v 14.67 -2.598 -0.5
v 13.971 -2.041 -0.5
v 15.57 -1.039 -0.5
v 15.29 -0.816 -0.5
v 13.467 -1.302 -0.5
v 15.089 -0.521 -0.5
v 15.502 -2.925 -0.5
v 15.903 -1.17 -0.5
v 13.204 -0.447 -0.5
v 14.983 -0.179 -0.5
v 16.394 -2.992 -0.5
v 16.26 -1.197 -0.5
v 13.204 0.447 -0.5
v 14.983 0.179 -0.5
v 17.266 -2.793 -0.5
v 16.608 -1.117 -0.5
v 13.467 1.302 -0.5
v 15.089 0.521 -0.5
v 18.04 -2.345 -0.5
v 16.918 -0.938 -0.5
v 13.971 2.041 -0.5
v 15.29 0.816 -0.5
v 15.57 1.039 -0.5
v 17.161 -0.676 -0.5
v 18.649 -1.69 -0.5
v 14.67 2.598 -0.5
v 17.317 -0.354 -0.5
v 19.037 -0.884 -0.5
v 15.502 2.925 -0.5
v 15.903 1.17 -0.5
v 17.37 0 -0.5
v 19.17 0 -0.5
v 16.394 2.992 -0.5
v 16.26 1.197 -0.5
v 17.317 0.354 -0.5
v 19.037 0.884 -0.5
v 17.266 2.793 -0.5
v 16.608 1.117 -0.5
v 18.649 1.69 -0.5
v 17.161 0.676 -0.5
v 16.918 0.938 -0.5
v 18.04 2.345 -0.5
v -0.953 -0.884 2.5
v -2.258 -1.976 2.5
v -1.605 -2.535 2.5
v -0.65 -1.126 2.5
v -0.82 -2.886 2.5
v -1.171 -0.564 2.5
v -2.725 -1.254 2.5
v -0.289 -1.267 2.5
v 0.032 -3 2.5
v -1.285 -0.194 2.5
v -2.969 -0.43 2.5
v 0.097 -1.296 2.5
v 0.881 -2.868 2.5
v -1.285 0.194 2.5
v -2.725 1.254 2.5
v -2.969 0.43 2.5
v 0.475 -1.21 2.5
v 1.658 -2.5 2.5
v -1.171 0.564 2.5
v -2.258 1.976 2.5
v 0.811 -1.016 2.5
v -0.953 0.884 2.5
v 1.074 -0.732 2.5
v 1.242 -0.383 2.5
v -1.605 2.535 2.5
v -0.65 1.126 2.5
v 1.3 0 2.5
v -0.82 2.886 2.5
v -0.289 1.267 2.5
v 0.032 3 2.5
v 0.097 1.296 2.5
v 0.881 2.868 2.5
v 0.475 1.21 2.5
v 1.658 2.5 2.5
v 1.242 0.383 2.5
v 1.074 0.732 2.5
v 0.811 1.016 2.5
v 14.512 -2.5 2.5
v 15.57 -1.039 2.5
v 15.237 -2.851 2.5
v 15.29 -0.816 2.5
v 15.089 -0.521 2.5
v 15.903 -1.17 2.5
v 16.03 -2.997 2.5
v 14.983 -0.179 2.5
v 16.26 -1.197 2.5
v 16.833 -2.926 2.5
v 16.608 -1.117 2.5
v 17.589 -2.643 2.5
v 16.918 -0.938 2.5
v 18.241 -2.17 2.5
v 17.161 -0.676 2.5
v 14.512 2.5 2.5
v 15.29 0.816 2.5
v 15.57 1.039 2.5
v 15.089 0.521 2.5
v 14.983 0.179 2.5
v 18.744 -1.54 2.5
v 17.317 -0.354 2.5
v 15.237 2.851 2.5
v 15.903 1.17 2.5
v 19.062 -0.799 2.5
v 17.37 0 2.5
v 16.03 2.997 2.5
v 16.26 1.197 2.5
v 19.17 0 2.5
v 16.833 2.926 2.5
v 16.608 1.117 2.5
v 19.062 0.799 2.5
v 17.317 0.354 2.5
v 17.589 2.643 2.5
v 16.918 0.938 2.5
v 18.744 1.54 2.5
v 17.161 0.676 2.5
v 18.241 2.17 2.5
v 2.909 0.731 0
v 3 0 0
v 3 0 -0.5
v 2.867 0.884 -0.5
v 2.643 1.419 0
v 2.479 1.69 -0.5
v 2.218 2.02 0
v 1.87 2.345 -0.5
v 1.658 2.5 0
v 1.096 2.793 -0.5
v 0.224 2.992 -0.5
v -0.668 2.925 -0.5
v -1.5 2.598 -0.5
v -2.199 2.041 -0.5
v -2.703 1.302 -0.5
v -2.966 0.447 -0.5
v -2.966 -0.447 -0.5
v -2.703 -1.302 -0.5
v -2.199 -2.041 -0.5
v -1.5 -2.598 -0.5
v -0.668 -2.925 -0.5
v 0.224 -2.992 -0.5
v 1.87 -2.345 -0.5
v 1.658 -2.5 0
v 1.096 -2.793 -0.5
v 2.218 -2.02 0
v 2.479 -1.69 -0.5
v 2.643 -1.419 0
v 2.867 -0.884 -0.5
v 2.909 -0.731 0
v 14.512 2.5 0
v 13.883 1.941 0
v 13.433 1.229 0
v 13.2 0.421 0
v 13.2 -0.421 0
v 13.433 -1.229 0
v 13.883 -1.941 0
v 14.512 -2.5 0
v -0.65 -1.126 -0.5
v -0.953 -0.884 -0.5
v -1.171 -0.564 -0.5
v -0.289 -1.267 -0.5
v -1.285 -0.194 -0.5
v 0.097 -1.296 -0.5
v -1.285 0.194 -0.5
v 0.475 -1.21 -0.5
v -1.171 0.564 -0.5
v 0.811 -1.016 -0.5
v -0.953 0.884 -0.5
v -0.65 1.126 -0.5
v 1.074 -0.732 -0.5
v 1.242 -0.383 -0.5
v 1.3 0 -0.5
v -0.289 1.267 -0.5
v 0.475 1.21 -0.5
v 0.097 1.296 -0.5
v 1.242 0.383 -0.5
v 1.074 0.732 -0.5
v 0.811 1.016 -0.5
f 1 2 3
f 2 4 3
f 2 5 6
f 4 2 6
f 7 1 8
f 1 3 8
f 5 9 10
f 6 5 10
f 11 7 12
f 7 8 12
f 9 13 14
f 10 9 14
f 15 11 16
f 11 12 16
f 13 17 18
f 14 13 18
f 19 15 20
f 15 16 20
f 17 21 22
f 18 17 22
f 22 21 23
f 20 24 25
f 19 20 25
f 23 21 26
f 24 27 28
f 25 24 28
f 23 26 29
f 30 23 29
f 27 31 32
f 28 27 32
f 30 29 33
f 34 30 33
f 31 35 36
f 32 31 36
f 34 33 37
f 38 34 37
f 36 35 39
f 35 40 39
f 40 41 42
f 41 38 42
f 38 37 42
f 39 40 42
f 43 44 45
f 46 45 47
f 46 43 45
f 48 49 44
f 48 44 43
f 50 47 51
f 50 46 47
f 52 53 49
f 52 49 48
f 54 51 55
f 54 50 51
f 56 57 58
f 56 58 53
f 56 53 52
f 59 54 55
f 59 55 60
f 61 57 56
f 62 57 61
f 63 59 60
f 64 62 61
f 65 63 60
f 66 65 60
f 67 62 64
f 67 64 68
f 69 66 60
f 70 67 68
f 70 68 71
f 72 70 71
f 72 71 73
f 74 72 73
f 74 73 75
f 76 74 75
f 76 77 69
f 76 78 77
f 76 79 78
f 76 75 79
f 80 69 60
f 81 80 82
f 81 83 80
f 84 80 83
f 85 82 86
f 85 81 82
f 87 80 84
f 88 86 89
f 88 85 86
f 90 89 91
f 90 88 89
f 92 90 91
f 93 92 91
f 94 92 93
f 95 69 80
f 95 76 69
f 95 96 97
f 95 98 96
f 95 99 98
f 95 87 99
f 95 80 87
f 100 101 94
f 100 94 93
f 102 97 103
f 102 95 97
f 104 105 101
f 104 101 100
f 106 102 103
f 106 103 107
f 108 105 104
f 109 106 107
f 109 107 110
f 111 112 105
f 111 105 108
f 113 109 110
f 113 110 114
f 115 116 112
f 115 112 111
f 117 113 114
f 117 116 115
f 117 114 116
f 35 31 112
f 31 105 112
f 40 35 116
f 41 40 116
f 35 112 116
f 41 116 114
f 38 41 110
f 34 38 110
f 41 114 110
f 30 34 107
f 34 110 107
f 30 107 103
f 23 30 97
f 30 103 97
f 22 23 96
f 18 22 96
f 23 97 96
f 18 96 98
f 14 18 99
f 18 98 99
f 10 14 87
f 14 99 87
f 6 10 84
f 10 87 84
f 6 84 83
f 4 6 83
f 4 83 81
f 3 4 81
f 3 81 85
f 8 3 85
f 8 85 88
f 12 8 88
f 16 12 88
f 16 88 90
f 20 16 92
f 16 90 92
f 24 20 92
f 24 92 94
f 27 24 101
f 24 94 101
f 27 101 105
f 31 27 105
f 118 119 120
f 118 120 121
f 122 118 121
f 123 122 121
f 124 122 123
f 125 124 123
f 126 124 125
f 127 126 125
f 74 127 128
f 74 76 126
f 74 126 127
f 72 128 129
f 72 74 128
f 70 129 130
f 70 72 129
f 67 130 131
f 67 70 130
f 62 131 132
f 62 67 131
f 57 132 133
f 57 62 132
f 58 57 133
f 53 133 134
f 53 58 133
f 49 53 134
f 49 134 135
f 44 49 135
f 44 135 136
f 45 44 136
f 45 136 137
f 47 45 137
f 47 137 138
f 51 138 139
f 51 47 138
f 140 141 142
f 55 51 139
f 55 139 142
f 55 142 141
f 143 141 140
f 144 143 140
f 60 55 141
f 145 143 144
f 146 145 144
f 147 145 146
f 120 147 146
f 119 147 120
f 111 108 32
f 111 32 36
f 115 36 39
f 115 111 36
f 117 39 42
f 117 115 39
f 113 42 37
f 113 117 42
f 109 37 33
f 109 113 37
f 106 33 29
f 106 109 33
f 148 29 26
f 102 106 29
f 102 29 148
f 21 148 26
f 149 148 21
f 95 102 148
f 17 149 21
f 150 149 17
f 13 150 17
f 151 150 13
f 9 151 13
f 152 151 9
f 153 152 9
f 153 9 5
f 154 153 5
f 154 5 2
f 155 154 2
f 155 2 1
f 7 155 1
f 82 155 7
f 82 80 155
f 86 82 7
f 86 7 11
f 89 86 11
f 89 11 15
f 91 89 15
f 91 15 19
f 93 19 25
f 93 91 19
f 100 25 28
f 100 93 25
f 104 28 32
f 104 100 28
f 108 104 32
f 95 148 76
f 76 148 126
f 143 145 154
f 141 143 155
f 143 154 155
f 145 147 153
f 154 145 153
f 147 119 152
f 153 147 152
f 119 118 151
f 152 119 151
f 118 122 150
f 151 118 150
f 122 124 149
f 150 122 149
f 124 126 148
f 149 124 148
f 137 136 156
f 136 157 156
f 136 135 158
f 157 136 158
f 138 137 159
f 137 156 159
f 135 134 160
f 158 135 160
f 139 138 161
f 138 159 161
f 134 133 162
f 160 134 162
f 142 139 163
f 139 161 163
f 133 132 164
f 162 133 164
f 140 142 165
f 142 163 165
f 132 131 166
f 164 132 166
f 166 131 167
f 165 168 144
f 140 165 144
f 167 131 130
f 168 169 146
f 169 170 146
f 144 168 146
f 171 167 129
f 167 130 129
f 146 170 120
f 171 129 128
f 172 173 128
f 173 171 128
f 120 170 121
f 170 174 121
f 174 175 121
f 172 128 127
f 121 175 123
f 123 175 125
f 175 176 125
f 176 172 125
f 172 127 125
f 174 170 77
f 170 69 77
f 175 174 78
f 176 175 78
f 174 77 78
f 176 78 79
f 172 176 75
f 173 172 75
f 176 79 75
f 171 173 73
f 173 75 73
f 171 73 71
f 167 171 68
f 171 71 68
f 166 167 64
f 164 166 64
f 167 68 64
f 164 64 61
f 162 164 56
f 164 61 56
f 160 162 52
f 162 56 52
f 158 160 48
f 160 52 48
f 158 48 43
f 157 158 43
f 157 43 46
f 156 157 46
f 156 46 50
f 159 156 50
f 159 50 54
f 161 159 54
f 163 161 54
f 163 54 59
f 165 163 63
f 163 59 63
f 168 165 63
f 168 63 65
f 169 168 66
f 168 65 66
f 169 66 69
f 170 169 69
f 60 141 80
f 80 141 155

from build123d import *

# Parameters (mm, degrees)
SKETCH14_R          = 1.3
SKETCH14_R_2        = 1.2
BOSS_EXTRUDE1_DEPTH = 2.5
SKETCH15_R          = 3
SKETCH15_R_2        = 1.2
SKETCH15_R_3        = 1.3
BOSS_EXTRUDE2_DEPTH = 3


with BuildPart() as part:
    # Sketch14 → Boss-Extrude1 (new body)
    with BuildSketch(Plane.XY):
        with BuildLine():
            Line((16.17, 2.5), (0, 2.5))
            ThreePointArc((0, 2.5), (-2.5, 0), (0, -2.5))
            Line((0, -2.5), (16.17, -2.5))
            ThreePointArc((16.17, -2.5), (18.67, 0), (16.17, 2.5))
        make_face()
        Circle(SKETCH14_R, mode=Mode.SUBTRACT)
        with Locations((16.17, 0)):
            Circle(SKETCH14_R_2, mode=Mode.SUBTRACT)
    extrude(amount=BOSS_EXTRUDE1_DEPTH)

    # Sketch15 → Boss-Extrude2 (add)
    with BuildSketch(Plane.XY.offset(2.5)):
        with Locations((16.17, 0)):
            Circle(SKETCH15_R)
        with Locations((16.17, 0)):
            Circle(SKETCH15_R_2, mode=Mode.SUBTRACT)
        Circle(SKETCH15_R)
        Circle(SKETCH15_R_3, mode=Mode.SUBTRACT)
    extrude(amount=-BOSS_EXTRUDE2_DEPTH)


solid = part.part
